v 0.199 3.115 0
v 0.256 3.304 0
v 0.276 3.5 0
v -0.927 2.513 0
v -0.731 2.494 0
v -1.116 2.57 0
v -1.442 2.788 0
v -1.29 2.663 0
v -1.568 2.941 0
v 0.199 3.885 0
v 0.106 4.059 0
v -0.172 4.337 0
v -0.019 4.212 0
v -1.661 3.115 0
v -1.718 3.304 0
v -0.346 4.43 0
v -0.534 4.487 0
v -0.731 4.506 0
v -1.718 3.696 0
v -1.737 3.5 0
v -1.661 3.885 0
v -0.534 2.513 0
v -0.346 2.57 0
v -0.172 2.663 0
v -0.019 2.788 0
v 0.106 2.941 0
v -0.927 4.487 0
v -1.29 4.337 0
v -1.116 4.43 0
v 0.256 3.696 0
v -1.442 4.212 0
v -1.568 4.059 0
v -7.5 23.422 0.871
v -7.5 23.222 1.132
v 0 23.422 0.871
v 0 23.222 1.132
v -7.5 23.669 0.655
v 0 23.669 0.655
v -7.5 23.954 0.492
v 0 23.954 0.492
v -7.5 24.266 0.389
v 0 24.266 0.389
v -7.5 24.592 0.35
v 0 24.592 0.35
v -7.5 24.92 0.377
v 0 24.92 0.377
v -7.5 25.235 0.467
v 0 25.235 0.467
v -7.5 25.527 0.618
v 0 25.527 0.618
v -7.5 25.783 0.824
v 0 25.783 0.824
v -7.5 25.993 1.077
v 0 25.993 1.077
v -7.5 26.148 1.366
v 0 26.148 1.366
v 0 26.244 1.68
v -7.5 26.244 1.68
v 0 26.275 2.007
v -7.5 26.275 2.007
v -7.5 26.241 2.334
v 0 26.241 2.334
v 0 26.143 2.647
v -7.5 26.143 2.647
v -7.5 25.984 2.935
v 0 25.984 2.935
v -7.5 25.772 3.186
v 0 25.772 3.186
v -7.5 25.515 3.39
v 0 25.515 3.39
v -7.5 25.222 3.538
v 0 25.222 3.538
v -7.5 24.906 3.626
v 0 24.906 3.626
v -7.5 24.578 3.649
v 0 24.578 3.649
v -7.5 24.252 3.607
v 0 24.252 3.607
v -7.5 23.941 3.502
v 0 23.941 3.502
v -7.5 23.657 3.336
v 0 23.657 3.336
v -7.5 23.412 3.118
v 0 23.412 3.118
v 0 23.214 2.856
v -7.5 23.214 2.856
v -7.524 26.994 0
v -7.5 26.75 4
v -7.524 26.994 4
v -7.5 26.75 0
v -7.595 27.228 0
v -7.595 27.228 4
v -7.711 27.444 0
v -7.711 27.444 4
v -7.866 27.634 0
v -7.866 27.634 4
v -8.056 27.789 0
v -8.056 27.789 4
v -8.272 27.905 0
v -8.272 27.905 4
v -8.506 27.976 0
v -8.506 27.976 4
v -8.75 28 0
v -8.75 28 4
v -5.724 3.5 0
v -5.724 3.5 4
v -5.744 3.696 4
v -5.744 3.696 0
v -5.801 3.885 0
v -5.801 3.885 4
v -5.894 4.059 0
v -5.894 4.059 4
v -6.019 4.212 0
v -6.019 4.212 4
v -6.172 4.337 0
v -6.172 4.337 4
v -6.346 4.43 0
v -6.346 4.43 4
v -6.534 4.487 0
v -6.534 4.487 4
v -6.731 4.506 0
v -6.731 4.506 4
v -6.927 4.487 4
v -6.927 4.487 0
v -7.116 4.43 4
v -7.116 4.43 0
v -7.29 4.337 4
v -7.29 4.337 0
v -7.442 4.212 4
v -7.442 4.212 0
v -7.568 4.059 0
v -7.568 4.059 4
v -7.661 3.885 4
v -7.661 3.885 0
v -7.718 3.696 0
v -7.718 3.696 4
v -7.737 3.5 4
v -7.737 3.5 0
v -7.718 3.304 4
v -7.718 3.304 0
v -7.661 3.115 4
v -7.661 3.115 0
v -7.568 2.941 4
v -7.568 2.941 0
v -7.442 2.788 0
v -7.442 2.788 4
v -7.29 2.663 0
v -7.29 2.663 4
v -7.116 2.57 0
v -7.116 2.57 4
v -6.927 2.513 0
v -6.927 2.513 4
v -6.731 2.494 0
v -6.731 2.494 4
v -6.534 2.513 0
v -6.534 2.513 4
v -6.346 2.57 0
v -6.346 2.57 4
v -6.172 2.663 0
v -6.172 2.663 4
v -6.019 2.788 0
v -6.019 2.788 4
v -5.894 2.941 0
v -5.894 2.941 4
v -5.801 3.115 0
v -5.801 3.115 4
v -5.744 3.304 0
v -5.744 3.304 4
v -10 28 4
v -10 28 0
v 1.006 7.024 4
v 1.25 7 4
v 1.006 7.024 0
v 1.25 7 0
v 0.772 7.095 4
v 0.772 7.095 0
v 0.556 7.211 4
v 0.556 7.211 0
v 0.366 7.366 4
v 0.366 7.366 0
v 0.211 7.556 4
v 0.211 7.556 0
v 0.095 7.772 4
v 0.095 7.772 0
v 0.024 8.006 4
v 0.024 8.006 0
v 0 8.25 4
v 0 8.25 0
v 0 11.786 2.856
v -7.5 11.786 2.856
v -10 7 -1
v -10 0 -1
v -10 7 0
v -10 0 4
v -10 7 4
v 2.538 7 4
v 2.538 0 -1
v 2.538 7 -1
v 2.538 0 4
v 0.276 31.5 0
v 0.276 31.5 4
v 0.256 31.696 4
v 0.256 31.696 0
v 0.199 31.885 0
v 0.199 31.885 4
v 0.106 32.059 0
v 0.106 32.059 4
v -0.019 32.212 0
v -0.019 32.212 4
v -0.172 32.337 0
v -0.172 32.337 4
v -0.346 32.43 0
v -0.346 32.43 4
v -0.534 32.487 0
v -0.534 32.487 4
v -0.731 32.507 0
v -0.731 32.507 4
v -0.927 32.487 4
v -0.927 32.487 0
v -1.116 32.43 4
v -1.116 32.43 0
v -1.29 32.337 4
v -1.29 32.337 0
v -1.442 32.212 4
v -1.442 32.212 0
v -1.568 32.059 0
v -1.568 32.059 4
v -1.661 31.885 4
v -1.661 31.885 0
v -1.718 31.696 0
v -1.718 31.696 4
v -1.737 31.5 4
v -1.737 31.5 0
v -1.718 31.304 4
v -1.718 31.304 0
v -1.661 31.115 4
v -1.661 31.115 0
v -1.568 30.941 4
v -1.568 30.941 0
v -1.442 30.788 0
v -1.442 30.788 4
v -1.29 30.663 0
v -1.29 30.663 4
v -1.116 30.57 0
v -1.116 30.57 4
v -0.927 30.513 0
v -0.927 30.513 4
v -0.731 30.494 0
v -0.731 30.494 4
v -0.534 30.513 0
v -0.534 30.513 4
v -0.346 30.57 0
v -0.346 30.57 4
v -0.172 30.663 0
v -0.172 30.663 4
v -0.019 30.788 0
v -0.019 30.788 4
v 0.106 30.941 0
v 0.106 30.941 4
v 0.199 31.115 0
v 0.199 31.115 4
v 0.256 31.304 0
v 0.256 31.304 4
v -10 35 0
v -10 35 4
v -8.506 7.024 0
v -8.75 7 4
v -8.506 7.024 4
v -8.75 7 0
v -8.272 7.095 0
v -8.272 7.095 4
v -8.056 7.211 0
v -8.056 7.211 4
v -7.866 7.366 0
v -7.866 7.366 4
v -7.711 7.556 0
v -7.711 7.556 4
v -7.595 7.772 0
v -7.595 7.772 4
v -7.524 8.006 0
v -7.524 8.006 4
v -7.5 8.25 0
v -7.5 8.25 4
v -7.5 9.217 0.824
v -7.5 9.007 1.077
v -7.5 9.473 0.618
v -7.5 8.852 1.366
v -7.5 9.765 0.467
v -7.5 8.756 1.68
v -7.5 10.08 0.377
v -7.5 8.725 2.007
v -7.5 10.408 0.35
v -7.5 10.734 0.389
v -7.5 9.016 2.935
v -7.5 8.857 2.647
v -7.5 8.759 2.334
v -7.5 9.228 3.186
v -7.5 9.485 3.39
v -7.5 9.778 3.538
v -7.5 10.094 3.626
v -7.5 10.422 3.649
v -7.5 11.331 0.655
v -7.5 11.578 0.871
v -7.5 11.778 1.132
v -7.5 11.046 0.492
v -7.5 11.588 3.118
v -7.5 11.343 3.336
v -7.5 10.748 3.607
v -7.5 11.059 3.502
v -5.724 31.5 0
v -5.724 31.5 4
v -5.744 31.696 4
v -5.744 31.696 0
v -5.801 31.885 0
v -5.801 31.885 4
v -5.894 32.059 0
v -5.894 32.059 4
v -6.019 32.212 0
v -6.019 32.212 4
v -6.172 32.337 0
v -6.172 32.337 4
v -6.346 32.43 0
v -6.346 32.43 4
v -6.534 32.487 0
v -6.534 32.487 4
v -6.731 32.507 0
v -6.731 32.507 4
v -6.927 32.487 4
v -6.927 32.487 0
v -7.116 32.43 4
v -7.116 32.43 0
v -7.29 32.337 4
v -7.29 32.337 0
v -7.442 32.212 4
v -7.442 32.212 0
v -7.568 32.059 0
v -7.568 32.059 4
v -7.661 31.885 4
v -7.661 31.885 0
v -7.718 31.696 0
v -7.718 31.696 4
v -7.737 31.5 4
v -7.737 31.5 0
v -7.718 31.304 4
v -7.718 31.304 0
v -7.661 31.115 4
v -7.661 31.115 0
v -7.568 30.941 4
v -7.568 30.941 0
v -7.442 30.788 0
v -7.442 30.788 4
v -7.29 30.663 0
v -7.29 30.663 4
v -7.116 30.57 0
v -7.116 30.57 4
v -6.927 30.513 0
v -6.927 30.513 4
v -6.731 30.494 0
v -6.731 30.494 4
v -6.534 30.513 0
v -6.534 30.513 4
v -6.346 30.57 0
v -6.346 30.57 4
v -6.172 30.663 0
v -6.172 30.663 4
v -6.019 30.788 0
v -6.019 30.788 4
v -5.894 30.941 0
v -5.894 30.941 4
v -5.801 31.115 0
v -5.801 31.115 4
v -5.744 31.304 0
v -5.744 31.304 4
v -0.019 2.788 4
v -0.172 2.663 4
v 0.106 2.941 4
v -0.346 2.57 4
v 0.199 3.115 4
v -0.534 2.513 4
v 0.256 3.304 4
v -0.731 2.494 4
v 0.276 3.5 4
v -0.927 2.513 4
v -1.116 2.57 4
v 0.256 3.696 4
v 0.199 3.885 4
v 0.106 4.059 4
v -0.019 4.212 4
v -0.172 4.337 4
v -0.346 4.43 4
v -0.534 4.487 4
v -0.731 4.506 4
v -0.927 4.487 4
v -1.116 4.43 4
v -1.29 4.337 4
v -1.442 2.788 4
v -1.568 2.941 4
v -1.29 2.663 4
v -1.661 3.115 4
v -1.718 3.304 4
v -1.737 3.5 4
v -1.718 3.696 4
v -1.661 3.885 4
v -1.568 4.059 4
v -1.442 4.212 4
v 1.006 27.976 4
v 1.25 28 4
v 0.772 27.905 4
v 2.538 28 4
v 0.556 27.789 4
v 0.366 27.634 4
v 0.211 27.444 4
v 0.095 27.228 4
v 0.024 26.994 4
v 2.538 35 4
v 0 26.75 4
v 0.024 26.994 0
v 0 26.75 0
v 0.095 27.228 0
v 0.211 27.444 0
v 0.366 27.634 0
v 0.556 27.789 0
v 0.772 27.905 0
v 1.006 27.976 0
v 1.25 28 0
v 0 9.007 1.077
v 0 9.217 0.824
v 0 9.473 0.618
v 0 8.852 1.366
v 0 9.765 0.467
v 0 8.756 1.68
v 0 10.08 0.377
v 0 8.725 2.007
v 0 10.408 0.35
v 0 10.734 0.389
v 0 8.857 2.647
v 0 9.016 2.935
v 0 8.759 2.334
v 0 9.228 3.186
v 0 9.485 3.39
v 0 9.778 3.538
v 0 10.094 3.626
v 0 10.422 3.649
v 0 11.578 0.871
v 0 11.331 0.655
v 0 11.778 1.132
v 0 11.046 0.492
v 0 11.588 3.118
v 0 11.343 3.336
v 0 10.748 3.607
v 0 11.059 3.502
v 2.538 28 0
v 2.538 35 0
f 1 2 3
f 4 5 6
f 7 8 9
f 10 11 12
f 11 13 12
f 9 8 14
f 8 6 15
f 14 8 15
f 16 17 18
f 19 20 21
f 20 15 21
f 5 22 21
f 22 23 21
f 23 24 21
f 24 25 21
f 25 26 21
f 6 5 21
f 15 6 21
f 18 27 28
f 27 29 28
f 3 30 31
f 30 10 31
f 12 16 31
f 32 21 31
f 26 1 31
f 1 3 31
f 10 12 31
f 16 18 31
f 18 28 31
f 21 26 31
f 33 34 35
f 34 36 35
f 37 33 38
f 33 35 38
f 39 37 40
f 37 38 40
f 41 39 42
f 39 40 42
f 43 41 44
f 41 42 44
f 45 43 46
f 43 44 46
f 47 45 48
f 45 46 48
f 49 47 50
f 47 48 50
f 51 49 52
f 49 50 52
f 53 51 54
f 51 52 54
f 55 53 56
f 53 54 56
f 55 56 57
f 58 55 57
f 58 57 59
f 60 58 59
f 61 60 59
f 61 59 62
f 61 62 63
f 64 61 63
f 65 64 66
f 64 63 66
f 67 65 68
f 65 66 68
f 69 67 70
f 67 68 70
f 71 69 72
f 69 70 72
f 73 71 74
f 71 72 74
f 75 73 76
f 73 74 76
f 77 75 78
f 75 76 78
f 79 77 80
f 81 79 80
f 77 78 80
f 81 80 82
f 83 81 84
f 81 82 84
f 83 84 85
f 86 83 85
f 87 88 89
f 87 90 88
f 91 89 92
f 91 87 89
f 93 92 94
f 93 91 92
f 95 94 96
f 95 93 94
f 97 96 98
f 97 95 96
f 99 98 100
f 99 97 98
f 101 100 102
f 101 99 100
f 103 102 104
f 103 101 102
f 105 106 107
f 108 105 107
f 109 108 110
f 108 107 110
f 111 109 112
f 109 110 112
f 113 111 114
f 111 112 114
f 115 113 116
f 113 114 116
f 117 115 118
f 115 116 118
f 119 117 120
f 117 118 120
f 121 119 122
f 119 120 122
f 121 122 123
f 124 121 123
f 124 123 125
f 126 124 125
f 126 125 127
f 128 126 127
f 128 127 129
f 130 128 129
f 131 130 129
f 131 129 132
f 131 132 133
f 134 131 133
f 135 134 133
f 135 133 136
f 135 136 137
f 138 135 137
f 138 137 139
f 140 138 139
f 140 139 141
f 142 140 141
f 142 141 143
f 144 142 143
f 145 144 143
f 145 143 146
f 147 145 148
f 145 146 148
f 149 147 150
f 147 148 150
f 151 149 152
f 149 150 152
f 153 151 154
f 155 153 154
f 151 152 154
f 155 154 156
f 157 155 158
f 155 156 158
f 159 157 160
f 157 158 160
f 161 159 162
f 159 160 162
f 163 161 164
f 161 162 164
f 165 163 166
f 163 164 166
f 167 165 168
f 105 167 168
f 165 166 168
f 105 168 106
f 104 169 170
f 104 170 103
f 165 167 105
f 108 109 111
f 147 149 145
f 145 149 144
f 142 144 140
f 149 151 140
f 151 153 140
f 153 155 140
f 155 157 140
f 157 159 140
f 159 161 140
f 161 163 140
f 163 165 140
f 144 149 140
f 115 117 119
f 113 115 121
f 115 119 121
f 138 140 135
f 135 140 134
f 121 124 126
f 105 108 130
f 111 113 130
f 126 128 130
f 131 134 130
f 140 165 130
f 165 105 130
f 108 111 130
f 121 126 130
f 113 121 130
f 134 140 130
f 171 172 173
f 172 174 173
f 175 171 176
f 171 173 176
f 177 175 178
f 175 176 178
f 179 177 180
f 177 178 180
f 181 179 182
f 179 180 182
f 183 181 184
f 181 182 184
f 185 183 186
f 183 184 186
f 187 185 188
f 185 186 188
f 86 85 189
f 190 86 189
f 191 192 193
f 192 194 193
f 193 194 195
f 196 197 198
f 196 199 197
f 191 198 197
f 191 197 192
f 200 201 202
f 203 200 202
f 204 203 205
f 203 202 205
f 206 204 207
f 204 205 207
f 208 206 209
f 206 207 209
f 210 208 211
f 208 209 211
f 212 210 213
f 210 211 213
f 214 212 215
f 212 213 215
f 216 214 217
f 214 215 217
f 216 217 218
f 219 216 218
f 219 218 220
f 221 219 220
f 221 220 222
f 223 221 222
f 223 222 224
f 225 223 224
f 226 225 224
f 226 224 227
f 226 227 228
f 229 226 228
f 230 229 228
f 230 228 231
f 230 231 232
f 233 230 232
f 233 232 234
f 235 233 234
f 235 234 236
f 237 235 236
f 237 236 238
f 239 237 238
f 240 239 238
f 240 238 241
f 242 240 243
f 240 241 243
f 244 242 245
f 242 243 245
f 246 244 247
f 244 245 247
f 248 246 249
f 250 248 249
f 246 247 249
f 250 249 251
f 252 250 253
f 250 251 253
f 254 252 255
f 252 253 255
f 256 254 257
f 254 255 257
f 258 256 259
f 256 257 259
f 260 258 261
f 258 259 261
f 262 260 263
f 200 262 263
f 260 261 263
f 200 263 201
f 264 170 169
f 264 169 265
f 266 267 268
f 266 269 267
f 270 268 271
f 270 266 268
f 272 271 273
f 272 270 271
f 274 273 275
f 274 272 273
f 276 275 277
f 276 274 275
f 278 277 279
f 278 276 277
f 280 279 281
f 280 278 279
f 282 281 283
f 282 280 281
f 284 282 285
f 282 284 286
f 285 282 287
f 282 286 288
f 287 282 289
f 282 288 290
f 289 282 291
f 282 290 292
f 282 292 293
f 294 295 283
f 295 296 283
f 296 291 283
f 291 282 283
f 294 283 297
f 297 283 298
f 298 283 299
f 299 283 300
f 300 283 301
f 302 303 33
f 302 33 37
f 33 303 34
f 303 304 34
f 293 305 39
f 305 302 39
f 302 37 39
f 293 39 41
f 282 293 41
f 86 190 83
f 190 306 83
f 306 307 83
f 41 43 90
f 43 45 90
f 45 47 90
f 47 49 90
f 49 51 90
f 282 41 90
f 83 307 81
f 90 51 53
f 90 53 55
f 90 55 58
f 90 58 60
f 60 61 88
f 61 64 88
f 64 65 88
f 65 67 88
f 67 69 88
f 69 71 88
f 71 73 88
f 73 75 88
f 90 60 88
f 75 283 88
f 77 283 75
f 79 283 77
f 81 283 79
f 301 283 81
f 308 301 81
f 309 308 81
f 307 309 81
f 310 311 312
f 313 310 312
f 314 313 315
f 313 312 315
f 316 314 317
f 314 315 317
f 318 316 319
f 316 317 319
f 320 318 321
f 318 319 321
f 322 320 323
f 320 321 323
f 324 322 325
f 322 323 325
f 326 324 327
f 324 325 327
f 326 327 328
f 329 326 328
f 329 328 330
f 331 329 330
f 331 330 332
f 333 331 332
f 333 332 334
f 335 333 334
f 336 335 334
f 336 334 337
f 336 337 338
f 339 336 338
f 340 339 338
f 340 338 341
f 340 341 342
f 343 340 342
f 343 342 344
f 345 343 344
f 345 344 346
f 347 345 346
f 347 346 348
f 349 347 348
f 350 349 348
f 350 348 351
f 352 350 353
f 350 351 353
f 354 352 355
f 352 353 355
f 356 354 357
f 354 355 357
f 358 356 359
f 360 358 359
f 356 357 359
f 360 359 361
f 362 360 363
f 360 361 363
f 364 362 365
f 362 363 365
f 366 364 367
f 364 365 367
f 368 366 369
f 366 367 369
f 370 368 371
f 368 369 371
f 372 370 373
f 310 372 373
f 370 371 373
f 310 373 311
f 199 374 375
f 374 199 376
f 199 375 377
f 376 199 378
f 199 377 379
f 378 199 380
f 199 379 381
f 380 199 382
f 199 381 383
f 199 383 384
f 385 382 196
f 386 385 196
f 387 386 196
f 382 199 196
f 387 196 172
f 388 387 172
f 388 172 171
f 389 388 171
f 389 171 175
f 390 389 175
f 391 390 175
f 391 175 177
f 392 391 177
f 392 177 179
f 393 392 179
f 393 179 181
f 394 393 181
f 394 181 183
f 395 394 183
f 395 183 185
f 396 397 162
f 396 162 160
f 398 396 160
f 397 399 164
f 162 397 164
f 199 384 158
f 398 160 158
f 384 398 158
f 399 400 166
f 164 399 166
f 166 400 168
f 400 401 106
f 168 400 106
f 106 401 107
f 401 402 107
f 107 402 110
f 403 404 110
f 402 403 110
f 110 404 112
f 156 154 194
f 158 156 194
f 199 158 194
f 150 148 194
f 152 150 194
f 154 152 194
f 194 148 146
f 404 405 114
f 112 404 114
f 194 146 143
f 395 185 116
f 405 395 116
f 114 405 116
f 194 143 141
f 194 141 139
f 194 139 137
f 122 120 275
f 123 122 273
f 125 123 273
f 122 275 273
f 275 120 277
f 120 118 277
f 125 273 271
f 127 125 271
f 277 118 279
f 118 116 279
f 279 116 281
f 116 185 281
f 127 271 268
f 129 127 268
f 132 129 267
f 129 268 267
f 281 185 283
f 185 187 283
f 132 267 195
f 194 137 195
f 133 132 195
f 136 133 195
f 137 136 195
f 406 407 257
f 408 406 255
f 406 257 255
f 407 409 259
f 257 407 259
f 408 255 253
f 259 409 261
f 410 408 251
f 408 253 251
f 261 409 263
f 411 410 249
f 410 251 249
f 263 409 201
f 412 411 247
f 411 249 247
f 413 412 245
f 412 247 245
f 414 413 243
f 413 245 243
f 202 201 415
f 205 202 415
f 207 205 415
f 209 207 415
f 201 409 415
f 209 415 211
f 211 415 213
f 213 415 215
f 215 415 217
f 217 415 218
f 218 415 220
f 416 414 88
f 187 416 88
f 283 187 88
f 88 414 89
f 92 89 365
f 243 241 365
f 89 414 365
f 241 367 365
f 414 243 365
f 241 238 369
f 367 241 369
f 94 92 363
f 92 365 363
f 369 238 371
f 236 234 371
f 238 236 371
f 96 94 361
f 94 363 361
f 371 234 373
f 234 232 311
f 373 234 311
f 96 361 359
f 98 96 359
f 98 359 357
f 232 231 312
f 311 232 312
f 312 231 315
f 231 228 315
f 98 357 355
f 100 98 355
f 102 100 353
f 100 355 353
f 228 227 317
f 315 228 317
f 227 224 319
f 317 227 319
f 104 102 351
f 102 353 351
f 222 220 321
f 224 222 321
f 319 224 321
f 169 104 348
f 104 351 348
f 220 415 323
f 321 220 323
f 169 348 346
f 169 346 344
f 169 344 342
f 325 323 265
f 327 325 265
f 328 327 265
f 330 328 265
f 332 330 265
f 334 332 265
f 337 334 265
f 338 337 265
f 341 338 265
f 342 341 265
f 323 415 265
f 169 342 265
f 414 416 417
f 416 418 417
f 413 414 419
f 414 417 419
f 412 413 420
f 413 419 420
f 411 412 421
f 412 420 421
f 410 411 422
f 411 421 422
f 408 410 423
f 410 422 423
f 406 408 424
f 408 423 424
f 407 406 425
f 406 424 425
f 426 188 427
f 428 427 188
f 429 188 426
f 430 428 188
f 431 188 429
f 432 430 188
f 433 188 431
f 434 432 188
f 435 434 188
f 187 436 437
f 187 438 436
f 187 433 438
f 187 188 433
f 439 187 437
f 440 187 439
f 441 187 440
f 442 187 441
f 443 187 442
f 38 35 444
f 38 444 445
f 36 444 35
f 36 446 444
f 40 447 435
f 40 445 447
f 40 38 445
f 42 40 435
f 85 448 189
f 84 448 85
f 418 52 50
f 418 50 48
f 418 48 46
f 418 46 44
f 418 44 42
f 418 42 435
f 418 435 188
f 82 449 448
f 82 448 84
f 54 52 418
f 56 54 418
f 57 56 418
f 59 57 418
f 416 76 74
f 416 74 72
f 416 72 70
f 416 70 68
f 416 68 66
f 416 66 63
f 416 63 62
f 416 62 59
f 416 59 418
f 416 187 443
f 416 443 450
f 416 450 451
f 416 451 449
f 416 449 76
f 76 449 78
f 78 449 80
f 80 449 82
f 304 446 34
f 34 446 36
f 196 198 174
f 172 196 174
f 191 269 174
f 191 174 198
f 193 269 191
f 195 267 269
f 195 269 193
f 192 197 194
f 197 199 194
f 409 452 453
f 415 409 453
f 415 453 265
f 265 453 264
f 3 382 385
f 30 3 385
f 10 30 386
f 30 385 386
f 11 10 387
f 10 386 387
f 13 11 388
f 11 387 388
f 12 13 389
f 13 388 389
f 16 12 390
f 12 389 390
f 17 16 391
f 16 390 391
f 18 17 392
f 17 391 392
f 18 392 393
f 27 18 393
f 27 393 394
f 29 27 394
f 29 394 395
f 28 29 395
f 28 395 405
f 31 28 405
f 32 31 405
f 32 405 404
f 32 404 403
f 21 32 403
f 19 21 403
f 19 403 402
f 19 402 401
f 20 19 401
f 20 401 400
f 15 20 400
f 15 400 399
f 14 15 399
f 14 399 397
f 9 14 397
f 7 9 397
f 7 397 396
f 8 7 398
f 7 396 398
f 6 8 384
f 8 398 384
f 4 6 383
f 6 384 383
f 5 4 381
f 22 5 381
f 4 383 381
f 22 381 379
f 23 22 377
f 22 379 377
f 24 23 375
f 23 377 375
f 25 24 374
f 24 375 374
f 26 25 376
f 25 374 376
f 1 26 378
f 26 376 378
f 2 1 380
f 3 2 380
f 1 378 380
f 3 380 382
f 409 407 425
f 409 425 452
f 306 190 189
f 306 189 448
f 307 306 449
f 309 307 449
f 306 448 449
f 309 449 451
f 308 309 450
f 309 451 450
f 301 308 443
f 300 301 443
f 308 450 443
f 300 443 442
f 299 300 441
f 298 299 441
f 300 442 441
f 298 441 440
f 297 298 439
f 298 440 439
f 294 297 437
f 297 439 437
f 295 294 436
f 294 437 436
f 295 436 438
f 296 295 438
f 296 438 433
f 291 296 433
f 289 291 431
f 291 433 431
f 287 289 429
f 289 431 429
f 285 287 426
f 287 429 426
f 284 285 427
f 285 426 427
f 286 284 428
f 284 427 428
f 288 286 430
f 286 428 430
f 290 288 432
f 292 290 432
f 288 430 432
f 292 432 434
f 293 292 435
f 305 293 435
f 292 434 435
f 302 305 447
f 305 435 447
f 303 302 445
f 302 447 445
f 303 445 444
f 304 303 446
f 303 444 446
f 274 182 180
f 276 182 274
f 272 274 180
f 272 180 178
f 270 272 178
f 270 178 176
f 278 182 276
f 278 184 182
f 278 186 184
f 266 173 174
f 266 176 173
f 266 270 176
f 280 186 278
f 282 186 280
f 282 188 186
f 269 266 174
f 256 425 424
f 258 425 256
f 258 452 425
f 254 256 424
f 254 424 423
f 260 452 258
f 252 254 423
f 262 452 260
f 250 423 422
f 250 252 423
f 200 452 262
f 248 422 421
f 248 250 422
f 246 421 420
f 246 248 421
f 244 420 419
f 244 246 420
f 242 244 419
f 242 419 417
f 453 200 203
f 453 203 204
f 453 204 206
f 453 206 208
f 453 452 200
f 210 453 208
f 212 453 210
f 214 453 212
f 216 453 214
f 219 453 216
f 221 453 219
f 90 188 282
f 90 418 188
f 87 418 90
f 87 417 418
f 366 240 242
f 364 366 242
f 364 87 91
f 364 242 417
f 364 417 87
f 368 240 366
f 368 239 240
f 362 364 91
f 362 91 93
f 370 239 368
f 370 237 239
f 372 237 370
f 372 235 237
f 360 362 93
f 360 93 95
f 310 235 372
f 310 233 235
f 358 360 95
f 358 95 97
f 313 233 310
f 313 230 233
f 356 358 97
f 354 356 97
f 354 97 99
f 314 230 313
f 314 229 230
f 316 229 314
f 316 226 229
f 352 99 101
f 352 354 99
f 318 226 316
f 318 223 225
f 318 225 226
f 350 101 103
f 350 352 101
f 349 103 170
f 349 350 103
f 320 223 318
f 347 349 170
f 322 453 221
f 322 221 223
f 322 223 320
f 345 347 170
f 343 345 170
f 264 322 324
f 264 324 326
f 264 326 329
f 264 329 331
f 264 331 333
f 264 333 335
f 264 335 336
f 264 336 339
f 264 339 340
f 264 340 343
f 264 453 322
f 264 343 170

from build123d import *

# Parameters (mm, degrees)
SKETCH1_W           = 12.538434267
SKETCH1_H           = 35
BOSS_EXTRUDE1_DEPTH = 4
SKETCH2_W           = 2.538434267
SKETCH2_H           = 21
CUT_EXTRUDE1_DEPTH  = 37.619666847
SKETCH3_W           = 2.5
SKETCH3_H           = 21
CUT_EXTRUDE2_DEPTH  = 37.619666847
CUT_EXTRUDE3_DEPTH  = 37.619666847
SKETCH5_W           = 7.5
SKETCH5_H           = 1.65
SKETCH6_W           = 7.5
SKETCH6_H           = 1.65
HOLE1_D             = 2.013
FILLET1_R           = 1.25
SKETCH9_W           = 12.538434267
SKETCH9_H           = 7
BOSS_EXTRUDE2_DEPTH = 1


with BuildPart() as part:
    # Sketch1 → Boss-Extrude1 (new body)
    with BuildSketch(Plane(origin=(0, 0, 0), x_dir=(-1, 0, 0), z_dir=(0, 0, -1))):
        with Locations((3.730782867, 17.5)):
            Rectangle(SKETCH1_W, SKETCH1_H)
    extrude(amount=-BOSS_EXTRUDE1_DEPTH)

    # Sketch2 → Cut-Extrude1 (cut, through all)
    with BuildSketch(Plane.XY.offset(4)):
        with Locations((1.269217133, 17.5)):
            Rectangle(SKETCH2_W, SKETCH2_H)
    extrude(amount=-CUT_EXTRUDE1_DEPTH, mode=Mode.SUBTRACT)

    # Sketch3 → Cut-Extrude2 (cut, through all)
    with BuildSketch(Plane.XY.offset(4)):
        with Locations((-8.75, 17.5)):
            Rectangle(SKETCH3_W, SKETCH3_H)
    extrude(amount=-CUT_EXTRUDE2_DEPTH, mode=Mode.SUBTRACT)

    # Sketch4 → Cut-Extrude3 (cut, through all)
    with BuildSketch(Plane(origin=(0, 0, 0), x_dir=(0, 0, -1), z_dir=(1, 0, 0))):
        with BuildLine():
            Line((-2.855933763, 23.21436986), (-2.855933763, 11.78563014))
            ThreePointArc((-2.855933763, 11.78563014), (-1.992824856, 12.024984399), (-1.13183027, 11.778132681))
            Line((-1.13183027, 11.778132681), (-1.13183027, 23.221867319))
            ThreePointArc((-1.13183027, 23.221867319), (-1.992824856, 22.975015601), (-2.855933763, 23.21436986))
        make_face()
    extrude(amount=-CUT_EXTRUDE3_DEPTH, mode=Mode.SUBTRACT)

    # Sketch5 → Cut-Revolve1 (revolve, cut)
    with BuildSketch(Plane.XY.offset(2)):
        with Locations((-3.75, 11.2)):
            Rectangle(SKETCH5_W, SKETCH5_H)
    revolve(axis=Axis((-7.5, 10.375, 2), (1, 0, 0)), mode=Mode.SUBTRACT)

    # Sketch6 → Cut-Revolve2 (revolve, cut)
    with BuildSketch(Plane.XY.offset(2)):
        with Locations((-3.75, 25.45)):
            Rectangle(SKETCH6_W, SKETCH6_H)
    revolve(axis=Axis((-7.5, 24.625, 2), (1, 0, 0)), mode=Mode.SUBTRACT)

    # Hole1 (through all)
    with Locations(Plane(origin=(0, 0, 0), x_dir=(-1, 0, 0), z_dir=(0, 0, -1))):
        with Locations((0.730782866, 3.5), (6.730782866, 3.5), (0.730782866, 31.5), (6.730782866, 31.5)):
            Hole(HOLE1_D / 2)

    # Fillet1
    fillet1_edges = [part.edges().sort_by_distance(p)[0] for p in [
        (0, 7, 2),
        (0, 28, 2),
        (-7.5, 28, 2),
        (-7.5, 7, 2),
    ]]
    fillet(fillet1_edges, radius=FILLET1_R)

    # Sketch9 → Boss-Extrude2 (add)
    with BuildSketch(Plane(origin=(0, 0, 0), x_dir=(-1, 0, 0), z_dir=(0, 0, -1))):
        with Locations((3.730782867, 3.5)):
            Rectangle(SKETCH9_W, SKETCH9_H)
    extrude(amount=BOSS_EXTRUDE2_DEPTH)


solid = part.part
